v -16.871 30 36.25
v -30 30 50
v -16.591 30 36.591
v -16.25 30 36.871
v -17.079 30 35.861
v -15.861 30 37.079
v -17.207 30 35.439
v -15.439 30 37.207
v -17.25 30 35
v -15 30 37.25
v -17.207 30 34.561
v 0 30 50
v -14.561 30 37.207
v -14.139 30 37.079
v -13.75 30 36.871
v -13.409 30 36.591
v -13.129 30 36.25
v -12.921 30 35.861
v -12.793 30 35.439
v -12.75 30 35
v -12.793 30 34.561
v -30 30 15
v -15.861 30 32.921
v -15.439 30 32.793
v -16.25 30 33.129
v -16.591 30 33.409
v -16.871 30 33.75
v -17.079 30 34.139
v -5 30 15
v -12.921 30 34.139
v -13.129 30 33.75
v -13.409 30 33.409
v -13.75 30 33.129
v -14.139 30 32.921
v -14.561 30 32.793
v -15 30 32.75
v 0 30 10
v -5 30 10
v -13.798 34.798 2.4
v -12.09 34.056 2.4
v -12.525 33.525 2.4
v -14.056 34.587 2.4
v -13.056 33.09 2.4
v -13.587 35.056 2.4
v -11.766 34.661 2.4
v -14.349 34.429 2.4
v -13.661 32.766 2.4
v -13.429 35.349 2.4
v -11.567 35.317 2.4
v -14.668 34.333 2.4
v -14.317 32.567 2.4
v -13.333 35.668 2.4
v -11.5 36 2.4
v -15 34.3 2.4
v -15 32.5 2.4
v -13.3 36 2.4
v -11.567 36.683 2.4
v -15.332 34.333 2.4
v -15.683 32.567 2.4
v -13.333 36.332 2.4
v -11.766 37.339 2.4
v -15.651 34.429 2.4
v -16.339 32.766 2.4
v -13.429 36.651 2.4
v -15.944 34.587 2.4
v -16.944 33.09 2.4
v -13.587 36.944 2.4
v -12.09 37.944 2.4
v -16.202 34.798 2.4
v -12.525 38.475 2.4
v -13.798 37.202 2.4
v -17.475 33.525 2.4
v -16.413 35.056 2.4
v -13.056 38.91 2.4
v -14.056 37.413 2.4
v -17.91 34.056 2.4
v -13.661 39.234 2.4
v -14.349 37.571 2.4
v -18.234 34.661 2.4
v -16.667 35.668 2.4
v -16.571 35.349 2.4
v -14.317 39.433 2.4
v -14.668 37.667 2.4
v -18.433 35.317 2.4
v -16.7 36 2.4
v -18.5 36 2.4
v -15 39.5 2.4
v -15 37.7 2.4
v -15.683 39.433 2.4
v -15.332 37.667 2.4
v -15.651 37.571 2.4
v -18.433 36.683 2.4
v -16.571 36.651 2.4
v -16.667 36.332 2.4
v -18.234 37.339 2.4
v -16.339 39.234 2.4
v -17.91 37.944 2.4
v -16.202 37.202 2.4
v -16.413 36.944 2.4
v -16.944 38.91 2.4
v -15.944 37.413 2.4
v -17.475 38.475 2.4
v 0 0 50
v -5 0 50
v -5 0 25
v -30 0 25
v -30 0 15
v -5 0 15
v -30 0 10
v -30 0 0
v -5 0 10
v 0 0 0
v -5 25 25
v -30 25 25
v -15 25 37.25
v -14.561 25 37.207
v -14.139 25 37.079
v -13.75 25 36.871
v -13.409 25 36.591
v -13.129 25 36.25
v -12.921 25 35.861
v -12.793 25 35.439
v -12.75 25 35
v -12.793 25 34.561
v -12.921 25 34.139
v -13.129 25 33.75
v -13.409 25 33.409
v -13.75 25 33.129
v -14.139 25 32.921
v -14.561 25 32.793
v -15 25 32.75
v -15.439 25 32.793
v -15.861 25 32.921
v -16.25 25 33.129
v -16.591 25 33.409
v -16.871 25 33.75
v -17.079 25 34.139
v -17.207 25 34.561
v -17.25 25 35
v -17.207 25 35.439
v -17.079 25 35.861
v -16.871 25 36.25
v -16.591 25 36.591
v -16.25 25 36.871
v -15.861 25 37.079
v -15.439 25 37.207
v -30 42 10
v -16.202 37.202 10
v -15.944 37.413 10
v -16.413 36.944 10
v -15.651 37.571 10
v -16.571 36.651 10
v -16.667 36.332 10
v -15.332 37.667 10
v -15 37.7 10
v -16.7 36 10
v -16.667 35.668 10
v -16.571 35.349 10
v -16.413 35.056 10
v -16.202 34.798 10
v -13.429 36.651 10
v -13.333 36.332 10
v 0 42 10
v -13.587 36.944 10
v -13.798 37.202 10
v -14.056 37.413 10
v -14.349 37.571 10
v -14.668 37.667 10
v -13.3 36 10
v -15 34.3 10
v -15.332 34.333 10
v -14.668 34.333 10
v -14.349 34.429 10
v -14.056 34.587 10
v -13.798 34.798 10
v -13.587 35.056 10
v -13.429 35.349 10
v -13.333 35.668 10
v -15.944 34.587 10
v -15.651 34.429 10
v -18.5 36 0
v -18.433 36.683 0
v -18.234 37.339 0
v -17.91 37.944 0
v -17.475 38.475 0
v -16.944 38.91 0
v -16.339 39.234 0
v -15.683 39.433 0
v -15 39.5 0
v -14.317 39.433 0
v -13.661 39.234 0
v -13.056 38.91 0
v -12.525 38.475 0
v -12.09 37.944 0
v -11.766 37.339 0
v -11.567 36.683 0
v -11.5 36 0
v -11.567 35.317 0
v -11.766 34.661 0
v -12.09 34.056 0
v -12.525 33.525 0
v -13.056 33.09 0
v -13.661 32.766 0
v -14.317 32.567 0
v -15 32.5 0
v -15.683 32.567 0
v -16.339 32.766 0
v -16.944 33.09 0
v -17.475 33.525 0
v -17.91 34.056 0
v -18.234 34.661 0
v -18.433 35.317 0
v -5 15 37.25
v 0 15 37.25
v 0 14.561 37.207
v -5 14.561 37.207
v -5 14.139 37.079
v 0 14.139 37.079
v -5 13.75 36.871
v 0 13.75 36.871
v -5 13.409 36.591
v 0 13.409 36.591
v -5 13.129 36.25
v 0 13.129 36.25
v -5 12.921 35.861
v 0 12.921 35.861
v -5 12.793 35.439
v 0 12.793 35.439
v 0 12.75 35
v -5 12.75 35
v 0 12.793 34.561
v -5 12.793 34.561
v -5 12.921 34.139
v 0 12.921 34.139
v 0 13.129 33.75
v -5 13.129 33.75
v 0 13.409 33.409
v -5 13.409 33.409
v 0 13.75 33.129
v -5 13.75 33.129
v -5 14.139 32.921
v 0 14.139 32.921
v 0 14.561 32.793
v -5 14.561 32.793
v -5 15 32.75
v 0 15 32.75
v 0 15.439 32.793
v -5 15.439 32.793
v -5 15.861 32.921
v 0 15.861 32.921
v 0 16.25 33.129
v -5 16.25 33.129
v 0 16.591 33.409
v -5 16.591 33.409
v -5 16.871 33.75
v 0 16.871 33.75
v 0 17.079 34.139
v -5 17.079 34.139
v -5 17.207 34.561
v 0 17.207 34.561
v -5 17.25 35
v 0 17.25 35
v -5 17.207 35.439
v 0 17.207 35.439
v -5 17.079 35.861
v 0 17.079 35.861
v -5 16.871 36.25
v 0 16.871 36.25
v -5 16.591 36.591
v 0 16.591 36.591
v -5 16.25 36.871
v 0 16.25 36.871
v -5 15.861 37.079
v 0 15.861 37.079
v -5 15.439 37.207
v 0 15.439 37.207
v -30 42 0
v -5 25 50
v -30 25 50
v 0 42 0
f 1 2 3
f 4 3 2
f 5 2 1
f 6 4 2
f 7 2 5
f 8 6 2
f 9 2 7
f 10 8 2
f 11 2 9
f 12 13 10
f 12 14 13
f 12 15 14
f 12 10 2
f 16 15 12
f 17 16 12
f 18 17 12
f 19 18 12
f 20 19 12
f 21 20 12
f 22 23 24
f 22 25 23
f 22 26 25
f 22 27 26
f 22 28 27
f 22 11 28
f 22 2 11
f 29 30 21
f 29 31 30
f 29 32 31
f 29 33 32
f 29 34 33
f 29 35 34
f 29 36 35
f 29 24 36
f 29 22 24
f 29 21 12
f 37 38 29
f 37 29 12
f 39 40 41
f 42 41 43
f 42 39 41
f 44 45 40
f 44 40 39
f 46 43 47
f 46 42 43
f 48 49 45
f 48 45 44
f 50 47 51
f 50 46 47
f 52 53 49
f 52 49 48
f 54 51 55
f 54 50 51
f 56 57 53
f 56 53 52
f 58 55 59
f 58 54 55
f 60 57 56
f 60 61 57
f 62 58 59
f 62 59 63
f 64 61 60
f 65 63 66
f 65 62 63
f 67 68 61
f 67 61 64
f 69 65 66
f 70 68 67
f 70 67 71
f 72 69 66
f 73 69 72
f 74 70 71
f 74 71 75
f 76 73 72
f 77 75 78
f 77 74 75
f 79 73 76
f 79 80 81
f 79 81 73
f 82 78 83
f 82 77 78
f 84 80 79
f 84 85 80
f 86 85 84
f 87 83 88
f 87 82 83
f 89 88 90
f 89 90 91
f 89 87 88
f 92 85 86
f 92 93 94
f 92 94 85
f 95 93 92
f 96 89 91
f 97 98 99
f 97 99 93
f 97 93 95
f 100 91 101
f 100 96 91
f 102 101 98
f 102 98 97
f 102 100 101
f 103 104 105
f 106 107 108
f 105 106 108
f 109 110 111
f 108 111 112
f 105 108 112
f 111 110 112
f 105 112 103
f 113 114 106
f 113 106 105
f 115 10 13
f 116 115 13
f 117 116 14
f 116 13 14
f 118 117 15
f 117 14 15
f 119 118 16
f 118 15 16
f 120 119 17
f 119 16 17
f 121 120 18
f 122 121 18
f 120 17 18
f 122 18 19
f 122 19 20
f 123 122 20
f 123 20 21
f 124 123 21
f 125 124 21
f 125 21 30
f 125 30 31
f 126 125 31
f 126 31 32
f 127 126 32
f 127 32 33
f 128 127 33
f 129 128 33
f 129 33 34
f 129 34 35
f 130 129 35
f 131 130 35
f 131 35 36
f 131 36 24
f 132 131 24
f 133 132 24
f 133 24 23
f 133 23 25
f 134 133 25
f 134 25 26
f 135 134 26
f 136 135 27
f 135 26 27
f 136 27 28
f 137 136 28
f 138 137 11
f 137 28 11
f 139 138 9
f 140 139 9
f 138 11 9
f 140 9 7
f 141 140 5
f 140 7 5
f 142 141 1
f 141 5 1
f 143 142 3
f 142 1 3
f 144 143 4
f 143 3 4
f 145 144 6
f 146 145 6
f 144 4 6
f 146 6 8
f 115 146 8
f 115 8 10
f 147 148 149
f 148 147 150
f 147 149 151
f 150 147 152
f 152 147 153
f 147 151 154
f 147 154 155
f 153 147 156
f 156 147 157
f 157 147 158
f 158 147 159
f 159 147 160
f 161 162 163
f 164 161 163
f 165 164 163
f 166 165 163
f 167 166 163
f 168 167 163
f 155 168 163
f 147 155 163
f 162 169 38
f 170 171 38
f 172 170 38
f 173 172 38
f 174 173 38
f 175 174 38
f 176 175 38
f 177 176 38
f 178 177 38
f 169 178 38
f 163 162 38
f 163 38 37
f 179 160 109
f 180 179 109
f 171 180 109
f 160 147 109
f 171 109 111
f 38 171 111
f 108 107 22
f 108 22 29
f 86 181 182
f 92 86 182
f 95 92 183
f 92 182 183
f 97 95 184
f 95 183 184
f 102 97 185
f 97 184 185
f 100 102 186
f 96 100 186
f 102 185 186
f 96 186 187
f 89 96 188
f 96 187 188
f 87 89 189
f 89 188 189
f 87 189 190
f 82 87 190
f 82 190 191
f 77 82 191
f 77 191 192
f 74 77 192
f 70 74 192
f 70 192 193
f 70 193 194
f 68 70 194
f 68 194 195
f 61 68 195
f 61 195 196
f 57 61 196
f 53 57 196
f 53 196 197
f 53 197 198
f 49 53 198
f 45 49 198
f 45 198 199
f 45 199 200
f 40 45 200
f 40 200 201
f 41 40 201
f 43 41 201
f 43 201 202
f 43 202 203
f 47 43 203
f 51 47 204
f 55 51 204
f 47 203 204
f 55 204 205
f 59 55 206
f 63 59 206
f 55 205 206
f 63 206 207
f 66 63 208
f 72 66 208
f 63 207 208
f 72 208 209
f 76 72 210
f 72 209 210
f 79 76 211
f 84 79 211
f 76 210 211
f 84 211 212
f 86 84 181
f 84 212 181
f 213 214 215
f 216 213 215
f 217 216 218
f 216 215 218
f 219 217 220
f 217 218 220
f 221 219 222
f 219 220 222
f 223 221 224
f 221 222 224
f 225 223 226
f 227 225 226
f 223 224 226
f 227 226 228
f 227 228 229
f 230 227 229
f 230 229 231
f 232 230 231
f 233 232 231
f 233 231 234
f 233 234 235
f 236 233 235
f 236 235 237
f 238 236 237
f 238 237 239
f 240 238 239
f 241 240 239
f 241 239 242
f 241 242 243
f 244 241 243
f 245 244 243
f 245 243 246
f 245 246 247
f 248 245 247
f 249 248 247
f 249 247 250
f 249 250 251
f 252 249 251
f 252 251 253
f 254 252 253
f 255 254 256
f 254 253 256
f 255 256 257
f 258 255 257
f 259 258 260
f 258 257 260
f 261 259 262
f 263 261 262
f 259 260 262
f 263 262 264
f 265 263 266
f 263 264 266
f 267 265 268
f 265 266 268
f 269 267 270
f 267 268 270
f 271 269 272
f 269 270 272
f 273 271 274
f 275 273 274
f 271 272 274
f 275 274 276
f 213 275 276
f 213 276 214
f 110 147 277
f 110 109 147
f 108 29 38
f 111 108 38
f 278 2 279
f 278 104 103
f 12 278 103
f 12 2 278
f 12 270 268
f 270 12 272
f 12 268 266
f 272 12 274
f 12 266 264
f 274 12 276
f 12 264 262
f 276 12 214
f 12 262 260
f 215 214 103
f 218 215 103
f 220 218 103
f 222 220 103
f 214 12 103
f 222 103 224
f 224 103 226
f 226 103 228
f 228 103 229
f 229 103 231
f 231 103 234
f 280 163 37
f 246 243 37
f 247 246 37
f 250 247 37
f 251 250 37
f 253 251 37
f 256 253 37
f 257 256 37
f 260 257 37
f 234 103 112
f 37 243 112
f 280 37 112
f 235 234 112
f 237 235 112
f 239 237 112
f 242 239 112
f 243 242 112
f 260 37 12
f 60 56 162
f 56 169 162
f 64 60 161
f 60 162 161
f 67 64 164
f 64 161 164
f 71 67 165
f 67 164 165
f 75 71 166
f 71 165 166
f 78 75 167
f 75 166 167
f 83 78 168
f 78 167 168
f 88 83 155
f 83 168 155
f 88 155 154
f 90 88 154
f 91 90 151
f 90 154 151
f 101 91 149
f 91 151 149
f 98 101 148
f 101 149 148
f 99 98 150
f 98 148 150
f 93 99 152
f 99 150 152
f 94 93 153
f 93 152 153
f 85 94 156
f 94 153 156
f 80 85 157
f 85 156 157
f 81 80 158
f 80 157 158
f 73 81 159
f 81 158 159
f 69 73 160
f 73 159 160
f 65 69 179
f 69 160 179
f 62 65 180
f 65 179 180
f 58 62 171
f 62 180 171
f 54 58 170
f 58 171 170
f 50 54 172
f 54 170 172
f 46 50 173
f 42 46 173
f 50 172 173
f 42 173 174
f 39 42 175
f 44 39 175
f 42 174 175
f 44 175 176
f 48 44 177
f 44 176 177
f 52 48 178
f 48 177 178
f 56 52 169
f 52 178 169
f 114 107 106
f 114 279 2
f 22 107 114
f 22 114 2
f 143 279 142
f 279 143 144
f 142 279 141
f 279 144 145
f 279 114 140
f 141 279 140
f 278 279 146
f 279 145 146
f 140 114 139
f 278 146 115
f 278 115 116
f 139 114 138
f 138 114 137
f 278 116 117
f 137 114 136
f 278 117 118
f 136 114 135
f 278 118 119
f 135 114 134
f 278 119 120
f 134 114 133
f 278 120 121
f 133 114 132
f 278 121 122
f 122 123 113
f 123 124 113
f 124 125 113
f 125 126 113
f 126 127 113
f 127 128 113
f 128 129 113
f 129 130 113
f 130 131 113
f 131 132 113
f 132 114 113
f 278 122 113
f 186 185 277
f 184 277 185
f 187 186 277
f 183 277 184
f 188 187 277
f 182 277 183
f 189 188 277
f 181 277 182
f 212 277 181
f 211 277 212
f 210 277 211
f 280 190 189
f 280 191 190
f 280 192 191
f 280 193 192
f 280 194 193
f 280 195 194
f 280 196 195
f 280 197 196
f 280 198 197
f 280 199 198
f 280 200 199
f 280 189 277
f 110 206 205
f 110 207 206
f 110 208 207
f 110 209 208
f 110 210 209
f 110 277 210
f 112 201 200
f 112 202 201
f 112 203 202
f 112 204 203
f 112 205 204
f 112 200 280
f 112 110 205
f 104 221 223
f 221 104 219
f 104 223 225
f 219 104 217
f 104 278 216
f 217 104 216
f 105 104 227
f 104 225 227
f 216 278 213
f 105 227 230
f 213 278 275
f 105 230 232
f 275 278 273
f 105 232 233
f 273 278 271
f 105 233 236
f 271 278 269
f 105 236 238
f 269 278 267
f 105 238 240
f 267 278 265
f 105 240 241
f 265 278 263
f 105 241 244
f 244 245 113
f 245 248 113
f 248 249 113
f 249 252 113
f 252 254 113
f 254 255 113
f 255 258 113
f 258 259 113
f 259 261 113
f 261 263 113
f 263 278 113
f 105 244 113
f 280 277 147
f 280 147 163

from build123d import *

# Parameters (mm, degrees)
ESBO_O1_W                                           = 30
ESBO_O1_H                                           = 30
RESSALTO_EXTRUS_O1_DEPTH                            = 50
ESBO_O2_W                                           = 25
ESBO_O2_H                                           = 5
CORTE_EXTRUS_O1_DEPTH                               = 31
CORTE_EXTRUS_O2_START                               = -5
ESBO_O3_W                                           = 25
ESBO_O3_H                                           = 25
CORTE_EXTRUS_O2_DEPTH                               = 26
FURO_COM_FOLGA_DE_M41_D                             = 4.5
FURO_COM_FOLGA_DE_M41_ON_FACE_2_D                   = 4.5
ESBO_O5_W                                           = 30
ESBO_O5_H                                           = 10
RESSALTO_EXTRUS_O2_DEPTH                            = 12
REBAIXO_PARA_PARAFUSO_COM_CABE_A_PANELA_D           = 3.4
REBAIXO_PARA_PARAFUSO_COM_CABE_A_PANELA_CBORE_D     = 7
REBAIXO_PARA_PARAFUSO_COM_CABE_A_PANELA_CBORE_DEPTH = 2.4


with BuildPart() as part:
    # Esboço1 → Ressalto-extrusão1 (new body)
    with BuildSketch(Plane.XY):
        with Locations((-15, 15)):
            Rectangle(ESBO_O1_W, ESBO_O1_H)
    extrude(amount=RESSALTO_EXTRUS_O1_DEPTH)

    # Esboço2 → Corte-extrusão1 (cut, through all)
    with BuildSketch(Plane(origin=(0, 30, 0), x_dir=(1, 0, 0), z_dir=(0, 1, 0))):
        with Locations((-17.5, -12.5)):
            Rectangle(ESBO_O2_W, ESBO_O2_H)
    extrude(amount=-CORTE_EXTRUS_O1_DEPTH, mode=Mode.SUBTRACT)

    # Esboço3 → Corte-extrusão2 (cut, through all)
    with BuildSketch(Plane(origin=(0, 30, 0), x_dir=(1, 0, 0), z_dir=(0, 1, 0)).offset(CORTE_EXTRUS_O2_START)):
        with Locations((-17.5, -37.5)):
            Rectangle(ESBO_O3_W, ESBO_O3_H)
    extrude(amount=-CORTE_EXTRUS_O2_DEPTH, mode=Mode.SUBTRACT)

    # Furo com folga de M41 (through all)
    with Locations(Plane(origin=(-5, 15, 35), x_dir=(0, 0, -1), z_dir=(-1, 0, 0))):
        with Locations((0, 0)):
            Hole(FURO_COM_FOLGA_DE_M41_D / 2)

    # Furo com folga de M41 on face 2 (through all)
    with Locations(Plane(origin=(-15, 25, 35), x_dir=(0, 0, -1), z_dir=(0, -1, 0))):
        with Locations((0, 0)):
            Hole(FURO_COM_FOLGA_DE_M41_ON_FACE_2_D / 2)

    # Esboço5 → Ressalto-extrusão2 (add)
    with BuildSketch(Plane(origin=(0, 30, 0), x_dir=(1, 0, 0), z_dir=(0, 1, 0))):
        with Locations((-15, -5)):
            Rectangle(ESBO_O5_W, ESBO_O5_H)
    extrude(amount=RESSALTO_EXTRUS_O2_DEPTH)

    # Rebaixo para parafuso com cabeça panela de M31 (through all)
    with Locations(Plane(origin=(0, 0, 0), x_dir=(-1, 0, 0), z_dir=(0, 0, -1))):
        with Locations((15, 36)):
            CounterBoreHole(REBAIXO_PARA_PARAFUSO_COM_CABE_A_PANELA_D / 2, REBAIXO_PARA_PARAFUSO_COM_CABE_A_PANELA_CBORE_D / 2, REBAIXO_PARA_PARAFUSO_COM_CABE_A_PANELA_CBORE_DEPTH)


solid = part.part
